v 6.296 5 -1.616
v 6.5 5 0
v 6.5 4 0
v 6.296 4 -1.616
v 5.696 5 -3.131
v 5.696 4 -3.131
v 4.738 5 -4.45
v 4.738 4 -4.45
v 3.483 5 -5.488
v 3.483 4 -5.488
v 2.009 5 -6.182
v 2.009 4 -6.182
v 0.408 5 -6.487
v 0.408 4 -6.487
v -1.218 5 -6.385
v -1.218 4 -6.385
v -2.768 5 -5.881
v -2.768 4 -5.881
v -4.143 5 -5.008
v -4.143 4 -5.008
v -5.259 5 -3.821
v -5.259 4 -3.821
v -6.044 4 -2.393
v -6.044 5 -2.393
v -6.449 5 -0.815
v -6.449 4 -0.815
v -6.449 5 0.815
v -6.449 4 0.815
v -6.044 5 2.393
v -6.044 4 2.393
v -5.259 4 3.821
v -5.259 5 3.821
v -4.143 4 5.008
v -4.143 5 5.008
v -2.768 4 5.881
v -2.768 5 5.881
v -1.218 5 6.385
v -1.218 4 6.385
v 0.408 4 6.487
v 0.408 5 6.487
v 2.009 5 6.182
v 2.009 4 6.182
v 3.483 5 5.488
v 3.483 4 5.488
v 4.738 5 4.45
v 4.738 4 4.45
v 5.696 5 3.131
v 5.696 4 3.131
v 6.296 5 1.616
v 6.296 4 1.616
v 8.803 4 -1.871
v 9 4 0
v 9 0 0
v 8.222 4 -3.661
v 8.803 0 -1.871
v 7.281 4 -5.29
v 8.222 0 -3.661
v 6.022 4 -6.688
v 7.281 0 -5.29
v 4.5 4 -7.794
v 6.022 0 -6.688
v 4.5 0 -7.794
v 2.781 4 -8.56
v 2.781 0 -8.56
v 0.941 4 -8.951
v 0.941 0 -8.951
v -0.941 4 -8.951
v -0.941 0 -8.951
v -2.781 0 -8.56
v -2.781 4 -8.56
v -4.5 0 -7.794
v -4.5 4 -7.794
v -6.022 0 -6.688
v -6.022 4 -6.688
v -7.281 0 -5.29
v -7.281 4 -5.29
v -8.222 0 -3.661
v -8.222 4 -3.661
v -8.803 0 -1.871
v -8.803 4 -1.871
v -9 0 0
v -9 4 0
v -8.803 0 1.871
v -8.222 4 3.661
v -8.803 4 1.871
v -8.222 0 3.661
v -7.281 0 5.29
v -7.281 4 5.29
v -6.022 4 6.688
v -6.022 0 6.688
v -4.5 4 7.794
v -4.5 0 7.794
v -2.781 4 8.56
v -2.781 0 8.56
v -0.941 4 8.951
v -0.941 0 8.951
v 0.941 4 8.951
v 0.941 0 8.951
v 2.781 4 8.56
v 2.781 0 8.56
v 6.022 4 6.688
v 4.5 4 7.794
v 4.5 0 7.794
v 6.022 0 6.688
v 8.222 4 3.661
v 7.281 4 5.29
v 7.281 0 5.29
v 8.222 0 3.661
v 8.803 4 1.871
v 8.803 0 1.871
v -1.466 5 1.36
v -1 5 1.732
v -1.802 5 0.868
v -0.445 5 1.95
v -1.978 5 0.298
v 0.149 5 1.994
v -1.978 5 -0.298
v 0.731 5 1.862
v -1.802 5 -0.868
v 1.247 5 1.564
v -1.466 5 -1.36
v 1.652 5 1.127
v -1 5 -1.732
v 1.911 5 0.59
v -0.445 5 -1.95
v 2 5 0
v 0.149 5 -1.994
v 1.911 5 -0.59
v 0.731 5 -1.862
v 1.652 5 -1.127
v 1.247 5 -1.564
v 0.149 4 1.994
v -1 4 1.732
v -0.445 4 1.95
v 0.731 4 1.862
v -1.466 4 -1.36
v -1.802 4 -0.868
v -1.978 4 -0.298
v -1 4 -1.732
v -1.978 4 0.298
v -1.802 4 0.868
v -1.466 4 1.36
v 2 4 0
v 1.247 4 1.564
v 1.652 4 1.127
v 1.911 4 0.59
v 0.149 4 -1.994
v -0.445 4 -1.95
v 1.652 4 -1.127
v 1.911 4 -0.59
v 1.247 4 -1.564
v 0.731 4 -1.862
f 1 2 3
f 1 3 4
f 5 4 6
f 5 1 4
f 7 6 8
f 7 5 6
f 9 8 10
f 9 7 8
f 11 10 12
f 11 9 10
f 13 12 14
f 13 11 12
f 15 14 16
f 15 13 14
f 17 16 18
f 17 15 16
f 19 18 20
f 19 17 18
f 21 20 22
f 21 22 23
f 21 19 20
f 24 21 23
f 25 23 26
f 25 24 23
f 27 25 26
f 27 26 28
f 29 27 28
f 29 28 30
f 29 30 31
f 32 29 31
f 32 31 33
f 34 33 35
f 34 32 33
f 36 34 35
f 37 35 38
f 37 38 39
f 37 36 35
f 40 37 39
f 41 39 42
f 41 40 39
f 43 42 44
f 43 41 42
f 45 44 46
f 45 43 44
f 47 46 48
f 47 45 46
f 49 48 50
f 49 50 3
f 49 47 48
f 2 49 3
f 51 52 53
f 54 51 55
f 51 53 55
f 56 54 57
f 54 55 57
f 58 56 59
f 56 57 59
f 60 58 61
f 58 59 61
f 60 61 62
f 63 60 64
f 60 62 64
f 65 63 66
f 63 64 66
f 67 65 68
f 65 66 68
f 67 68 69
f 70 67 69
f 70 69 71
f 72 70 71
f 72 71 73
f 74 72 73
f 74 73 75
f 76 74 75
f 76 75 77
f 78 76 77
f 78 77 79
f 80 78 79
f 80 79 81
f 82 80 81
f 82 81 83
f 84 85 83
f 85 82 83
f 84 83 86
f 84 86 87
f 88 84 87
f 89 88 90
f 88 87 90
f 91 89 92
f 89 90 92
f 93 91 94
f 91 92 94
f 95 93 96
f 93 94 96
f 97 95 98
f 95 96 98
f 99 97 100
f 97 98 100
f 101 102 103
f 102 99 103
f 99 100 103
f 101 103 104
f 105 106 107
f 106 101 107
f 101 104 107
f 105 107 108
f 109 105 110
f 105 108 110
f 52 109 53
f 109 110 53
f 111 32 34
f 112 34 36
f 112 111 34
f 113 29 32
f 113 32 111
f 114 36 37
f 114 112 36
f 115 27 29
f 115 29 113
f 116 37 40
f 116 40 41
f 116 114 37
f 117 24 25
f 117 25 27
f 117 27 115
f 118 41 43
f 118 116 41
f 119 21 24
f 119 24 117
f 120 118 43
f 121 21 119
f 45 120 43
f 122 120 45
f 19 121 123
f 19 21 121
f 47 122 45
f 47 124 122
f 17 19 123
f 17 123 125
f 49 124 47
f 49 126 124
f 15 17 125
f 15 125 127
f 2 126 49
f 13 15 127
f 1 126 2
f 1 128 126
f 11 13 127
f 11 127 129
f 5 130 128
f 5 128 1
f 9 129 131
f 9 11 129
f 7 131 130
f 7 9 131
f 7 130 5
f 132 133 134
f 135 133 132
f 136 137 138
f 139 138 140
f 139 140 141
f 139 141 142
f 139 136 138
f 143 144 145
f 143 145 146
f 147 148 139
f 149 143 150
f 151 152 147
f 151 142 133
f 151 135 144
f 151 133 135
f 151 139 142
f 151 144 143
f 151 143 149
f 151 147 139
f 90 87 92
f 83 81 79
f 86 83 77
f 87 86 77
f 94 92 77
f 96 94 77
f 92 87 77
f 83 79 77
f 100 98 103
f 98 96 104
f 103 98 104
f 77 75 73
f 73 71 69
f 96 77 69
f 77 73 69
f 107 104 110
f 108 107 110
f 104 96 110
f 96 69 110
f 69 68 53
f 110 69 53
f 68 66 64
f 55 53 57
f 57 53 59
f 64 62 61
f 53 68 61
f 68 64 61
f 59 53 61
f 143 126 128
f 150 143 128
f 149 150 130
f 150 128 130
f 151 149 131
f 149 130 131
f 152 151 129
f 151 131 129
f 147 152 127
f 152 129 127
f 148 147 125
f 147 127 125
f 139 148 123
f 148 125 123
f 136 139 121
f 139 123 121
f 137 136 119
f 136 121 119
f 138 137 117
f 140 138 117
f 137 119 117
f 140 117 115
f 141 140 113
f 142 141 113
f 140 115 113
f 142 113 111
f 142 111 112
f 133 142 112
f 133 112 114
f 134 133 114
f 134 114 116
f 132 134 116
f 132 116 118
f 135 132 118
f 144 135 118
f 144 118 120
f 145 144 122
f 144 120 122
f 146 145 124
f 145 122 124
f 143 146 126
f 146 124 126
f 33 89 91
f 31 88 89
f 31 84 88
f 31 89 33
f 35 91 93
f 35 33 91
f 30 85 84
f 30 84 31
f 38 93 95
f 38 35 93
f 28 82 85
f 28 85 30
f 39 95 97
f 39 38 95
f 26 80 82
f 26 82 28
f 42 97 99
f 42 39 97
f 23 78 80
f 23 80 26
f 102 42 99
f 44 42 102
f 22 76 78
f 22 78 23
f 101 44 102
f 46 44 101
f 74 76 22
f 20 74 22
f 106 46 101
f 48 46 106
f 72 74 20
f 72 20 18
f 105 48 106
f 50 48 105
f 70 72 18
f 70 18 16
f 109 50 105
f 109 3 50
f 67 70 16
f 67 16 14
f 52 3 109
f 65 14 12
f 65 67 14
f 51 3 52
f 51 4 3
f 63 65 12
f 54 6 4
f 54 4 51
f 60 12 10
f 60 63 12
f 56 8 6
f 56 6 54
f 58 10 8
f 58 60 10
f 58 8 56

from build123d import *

# Parameters (mm, degrees)
SKETCH_1_R          = 9
EXTRUDE_1_DEPTH     = 5
SKETCH_2_OUTSIDE_W  = 25.188
SKETCH_2_OUTSIDE_H  = 25.188
SKETCH_2_OUTSIDE_R  = 6.5
CUT_EXTRUDE_1_DEPTH = 1
SKETCH_3_R          = 2
CUT_EXTRUDE_2_DEPTH = 1


with BuildPart() as part:
    # 草图1 → 凸台-拉伸1 (new body)
    with BuildSketch(Plane(origin=(0, 0, 0), x_dir=(1, 0, 0), z_dir=(0, 1, 0))):
        Circle(SKETCH_1_R)
    extrude(amount=EXTRUDE_1_DEPTH)

    # 草图2 outside → 切除-拉伸1 (cut)
    with BuildSketch(Plane(origin=(0, 5, 0), x_dir=(1, 0, 0), z_dir=(0, 1, 0))):
        Rectangle(SKETCH_2_OUTSIDE_W, SKETCH_2_OUTSIDE_H)
        Circle(SKETCH_2_OUTSIDE_R, mode=Mode.SUBTRACT)
    extrude(amount=-CUT_EXTRUDE_1_DEPTH, mode=Mode.SUBTRACT)

    # 草图3 → 切除-拉伸2 (cut)
    with BuildSketch(Plane(origin=(0, 5, 0), x_dir=(1, 0, 0), z_dir=(0, 1, 0))):
        Circle(SKETCH_3_R)
    extrude(amount=-CUT_EXTRUDE_2_DEPTH, mode=Mode.SUBTRACT)


solid = part.part
